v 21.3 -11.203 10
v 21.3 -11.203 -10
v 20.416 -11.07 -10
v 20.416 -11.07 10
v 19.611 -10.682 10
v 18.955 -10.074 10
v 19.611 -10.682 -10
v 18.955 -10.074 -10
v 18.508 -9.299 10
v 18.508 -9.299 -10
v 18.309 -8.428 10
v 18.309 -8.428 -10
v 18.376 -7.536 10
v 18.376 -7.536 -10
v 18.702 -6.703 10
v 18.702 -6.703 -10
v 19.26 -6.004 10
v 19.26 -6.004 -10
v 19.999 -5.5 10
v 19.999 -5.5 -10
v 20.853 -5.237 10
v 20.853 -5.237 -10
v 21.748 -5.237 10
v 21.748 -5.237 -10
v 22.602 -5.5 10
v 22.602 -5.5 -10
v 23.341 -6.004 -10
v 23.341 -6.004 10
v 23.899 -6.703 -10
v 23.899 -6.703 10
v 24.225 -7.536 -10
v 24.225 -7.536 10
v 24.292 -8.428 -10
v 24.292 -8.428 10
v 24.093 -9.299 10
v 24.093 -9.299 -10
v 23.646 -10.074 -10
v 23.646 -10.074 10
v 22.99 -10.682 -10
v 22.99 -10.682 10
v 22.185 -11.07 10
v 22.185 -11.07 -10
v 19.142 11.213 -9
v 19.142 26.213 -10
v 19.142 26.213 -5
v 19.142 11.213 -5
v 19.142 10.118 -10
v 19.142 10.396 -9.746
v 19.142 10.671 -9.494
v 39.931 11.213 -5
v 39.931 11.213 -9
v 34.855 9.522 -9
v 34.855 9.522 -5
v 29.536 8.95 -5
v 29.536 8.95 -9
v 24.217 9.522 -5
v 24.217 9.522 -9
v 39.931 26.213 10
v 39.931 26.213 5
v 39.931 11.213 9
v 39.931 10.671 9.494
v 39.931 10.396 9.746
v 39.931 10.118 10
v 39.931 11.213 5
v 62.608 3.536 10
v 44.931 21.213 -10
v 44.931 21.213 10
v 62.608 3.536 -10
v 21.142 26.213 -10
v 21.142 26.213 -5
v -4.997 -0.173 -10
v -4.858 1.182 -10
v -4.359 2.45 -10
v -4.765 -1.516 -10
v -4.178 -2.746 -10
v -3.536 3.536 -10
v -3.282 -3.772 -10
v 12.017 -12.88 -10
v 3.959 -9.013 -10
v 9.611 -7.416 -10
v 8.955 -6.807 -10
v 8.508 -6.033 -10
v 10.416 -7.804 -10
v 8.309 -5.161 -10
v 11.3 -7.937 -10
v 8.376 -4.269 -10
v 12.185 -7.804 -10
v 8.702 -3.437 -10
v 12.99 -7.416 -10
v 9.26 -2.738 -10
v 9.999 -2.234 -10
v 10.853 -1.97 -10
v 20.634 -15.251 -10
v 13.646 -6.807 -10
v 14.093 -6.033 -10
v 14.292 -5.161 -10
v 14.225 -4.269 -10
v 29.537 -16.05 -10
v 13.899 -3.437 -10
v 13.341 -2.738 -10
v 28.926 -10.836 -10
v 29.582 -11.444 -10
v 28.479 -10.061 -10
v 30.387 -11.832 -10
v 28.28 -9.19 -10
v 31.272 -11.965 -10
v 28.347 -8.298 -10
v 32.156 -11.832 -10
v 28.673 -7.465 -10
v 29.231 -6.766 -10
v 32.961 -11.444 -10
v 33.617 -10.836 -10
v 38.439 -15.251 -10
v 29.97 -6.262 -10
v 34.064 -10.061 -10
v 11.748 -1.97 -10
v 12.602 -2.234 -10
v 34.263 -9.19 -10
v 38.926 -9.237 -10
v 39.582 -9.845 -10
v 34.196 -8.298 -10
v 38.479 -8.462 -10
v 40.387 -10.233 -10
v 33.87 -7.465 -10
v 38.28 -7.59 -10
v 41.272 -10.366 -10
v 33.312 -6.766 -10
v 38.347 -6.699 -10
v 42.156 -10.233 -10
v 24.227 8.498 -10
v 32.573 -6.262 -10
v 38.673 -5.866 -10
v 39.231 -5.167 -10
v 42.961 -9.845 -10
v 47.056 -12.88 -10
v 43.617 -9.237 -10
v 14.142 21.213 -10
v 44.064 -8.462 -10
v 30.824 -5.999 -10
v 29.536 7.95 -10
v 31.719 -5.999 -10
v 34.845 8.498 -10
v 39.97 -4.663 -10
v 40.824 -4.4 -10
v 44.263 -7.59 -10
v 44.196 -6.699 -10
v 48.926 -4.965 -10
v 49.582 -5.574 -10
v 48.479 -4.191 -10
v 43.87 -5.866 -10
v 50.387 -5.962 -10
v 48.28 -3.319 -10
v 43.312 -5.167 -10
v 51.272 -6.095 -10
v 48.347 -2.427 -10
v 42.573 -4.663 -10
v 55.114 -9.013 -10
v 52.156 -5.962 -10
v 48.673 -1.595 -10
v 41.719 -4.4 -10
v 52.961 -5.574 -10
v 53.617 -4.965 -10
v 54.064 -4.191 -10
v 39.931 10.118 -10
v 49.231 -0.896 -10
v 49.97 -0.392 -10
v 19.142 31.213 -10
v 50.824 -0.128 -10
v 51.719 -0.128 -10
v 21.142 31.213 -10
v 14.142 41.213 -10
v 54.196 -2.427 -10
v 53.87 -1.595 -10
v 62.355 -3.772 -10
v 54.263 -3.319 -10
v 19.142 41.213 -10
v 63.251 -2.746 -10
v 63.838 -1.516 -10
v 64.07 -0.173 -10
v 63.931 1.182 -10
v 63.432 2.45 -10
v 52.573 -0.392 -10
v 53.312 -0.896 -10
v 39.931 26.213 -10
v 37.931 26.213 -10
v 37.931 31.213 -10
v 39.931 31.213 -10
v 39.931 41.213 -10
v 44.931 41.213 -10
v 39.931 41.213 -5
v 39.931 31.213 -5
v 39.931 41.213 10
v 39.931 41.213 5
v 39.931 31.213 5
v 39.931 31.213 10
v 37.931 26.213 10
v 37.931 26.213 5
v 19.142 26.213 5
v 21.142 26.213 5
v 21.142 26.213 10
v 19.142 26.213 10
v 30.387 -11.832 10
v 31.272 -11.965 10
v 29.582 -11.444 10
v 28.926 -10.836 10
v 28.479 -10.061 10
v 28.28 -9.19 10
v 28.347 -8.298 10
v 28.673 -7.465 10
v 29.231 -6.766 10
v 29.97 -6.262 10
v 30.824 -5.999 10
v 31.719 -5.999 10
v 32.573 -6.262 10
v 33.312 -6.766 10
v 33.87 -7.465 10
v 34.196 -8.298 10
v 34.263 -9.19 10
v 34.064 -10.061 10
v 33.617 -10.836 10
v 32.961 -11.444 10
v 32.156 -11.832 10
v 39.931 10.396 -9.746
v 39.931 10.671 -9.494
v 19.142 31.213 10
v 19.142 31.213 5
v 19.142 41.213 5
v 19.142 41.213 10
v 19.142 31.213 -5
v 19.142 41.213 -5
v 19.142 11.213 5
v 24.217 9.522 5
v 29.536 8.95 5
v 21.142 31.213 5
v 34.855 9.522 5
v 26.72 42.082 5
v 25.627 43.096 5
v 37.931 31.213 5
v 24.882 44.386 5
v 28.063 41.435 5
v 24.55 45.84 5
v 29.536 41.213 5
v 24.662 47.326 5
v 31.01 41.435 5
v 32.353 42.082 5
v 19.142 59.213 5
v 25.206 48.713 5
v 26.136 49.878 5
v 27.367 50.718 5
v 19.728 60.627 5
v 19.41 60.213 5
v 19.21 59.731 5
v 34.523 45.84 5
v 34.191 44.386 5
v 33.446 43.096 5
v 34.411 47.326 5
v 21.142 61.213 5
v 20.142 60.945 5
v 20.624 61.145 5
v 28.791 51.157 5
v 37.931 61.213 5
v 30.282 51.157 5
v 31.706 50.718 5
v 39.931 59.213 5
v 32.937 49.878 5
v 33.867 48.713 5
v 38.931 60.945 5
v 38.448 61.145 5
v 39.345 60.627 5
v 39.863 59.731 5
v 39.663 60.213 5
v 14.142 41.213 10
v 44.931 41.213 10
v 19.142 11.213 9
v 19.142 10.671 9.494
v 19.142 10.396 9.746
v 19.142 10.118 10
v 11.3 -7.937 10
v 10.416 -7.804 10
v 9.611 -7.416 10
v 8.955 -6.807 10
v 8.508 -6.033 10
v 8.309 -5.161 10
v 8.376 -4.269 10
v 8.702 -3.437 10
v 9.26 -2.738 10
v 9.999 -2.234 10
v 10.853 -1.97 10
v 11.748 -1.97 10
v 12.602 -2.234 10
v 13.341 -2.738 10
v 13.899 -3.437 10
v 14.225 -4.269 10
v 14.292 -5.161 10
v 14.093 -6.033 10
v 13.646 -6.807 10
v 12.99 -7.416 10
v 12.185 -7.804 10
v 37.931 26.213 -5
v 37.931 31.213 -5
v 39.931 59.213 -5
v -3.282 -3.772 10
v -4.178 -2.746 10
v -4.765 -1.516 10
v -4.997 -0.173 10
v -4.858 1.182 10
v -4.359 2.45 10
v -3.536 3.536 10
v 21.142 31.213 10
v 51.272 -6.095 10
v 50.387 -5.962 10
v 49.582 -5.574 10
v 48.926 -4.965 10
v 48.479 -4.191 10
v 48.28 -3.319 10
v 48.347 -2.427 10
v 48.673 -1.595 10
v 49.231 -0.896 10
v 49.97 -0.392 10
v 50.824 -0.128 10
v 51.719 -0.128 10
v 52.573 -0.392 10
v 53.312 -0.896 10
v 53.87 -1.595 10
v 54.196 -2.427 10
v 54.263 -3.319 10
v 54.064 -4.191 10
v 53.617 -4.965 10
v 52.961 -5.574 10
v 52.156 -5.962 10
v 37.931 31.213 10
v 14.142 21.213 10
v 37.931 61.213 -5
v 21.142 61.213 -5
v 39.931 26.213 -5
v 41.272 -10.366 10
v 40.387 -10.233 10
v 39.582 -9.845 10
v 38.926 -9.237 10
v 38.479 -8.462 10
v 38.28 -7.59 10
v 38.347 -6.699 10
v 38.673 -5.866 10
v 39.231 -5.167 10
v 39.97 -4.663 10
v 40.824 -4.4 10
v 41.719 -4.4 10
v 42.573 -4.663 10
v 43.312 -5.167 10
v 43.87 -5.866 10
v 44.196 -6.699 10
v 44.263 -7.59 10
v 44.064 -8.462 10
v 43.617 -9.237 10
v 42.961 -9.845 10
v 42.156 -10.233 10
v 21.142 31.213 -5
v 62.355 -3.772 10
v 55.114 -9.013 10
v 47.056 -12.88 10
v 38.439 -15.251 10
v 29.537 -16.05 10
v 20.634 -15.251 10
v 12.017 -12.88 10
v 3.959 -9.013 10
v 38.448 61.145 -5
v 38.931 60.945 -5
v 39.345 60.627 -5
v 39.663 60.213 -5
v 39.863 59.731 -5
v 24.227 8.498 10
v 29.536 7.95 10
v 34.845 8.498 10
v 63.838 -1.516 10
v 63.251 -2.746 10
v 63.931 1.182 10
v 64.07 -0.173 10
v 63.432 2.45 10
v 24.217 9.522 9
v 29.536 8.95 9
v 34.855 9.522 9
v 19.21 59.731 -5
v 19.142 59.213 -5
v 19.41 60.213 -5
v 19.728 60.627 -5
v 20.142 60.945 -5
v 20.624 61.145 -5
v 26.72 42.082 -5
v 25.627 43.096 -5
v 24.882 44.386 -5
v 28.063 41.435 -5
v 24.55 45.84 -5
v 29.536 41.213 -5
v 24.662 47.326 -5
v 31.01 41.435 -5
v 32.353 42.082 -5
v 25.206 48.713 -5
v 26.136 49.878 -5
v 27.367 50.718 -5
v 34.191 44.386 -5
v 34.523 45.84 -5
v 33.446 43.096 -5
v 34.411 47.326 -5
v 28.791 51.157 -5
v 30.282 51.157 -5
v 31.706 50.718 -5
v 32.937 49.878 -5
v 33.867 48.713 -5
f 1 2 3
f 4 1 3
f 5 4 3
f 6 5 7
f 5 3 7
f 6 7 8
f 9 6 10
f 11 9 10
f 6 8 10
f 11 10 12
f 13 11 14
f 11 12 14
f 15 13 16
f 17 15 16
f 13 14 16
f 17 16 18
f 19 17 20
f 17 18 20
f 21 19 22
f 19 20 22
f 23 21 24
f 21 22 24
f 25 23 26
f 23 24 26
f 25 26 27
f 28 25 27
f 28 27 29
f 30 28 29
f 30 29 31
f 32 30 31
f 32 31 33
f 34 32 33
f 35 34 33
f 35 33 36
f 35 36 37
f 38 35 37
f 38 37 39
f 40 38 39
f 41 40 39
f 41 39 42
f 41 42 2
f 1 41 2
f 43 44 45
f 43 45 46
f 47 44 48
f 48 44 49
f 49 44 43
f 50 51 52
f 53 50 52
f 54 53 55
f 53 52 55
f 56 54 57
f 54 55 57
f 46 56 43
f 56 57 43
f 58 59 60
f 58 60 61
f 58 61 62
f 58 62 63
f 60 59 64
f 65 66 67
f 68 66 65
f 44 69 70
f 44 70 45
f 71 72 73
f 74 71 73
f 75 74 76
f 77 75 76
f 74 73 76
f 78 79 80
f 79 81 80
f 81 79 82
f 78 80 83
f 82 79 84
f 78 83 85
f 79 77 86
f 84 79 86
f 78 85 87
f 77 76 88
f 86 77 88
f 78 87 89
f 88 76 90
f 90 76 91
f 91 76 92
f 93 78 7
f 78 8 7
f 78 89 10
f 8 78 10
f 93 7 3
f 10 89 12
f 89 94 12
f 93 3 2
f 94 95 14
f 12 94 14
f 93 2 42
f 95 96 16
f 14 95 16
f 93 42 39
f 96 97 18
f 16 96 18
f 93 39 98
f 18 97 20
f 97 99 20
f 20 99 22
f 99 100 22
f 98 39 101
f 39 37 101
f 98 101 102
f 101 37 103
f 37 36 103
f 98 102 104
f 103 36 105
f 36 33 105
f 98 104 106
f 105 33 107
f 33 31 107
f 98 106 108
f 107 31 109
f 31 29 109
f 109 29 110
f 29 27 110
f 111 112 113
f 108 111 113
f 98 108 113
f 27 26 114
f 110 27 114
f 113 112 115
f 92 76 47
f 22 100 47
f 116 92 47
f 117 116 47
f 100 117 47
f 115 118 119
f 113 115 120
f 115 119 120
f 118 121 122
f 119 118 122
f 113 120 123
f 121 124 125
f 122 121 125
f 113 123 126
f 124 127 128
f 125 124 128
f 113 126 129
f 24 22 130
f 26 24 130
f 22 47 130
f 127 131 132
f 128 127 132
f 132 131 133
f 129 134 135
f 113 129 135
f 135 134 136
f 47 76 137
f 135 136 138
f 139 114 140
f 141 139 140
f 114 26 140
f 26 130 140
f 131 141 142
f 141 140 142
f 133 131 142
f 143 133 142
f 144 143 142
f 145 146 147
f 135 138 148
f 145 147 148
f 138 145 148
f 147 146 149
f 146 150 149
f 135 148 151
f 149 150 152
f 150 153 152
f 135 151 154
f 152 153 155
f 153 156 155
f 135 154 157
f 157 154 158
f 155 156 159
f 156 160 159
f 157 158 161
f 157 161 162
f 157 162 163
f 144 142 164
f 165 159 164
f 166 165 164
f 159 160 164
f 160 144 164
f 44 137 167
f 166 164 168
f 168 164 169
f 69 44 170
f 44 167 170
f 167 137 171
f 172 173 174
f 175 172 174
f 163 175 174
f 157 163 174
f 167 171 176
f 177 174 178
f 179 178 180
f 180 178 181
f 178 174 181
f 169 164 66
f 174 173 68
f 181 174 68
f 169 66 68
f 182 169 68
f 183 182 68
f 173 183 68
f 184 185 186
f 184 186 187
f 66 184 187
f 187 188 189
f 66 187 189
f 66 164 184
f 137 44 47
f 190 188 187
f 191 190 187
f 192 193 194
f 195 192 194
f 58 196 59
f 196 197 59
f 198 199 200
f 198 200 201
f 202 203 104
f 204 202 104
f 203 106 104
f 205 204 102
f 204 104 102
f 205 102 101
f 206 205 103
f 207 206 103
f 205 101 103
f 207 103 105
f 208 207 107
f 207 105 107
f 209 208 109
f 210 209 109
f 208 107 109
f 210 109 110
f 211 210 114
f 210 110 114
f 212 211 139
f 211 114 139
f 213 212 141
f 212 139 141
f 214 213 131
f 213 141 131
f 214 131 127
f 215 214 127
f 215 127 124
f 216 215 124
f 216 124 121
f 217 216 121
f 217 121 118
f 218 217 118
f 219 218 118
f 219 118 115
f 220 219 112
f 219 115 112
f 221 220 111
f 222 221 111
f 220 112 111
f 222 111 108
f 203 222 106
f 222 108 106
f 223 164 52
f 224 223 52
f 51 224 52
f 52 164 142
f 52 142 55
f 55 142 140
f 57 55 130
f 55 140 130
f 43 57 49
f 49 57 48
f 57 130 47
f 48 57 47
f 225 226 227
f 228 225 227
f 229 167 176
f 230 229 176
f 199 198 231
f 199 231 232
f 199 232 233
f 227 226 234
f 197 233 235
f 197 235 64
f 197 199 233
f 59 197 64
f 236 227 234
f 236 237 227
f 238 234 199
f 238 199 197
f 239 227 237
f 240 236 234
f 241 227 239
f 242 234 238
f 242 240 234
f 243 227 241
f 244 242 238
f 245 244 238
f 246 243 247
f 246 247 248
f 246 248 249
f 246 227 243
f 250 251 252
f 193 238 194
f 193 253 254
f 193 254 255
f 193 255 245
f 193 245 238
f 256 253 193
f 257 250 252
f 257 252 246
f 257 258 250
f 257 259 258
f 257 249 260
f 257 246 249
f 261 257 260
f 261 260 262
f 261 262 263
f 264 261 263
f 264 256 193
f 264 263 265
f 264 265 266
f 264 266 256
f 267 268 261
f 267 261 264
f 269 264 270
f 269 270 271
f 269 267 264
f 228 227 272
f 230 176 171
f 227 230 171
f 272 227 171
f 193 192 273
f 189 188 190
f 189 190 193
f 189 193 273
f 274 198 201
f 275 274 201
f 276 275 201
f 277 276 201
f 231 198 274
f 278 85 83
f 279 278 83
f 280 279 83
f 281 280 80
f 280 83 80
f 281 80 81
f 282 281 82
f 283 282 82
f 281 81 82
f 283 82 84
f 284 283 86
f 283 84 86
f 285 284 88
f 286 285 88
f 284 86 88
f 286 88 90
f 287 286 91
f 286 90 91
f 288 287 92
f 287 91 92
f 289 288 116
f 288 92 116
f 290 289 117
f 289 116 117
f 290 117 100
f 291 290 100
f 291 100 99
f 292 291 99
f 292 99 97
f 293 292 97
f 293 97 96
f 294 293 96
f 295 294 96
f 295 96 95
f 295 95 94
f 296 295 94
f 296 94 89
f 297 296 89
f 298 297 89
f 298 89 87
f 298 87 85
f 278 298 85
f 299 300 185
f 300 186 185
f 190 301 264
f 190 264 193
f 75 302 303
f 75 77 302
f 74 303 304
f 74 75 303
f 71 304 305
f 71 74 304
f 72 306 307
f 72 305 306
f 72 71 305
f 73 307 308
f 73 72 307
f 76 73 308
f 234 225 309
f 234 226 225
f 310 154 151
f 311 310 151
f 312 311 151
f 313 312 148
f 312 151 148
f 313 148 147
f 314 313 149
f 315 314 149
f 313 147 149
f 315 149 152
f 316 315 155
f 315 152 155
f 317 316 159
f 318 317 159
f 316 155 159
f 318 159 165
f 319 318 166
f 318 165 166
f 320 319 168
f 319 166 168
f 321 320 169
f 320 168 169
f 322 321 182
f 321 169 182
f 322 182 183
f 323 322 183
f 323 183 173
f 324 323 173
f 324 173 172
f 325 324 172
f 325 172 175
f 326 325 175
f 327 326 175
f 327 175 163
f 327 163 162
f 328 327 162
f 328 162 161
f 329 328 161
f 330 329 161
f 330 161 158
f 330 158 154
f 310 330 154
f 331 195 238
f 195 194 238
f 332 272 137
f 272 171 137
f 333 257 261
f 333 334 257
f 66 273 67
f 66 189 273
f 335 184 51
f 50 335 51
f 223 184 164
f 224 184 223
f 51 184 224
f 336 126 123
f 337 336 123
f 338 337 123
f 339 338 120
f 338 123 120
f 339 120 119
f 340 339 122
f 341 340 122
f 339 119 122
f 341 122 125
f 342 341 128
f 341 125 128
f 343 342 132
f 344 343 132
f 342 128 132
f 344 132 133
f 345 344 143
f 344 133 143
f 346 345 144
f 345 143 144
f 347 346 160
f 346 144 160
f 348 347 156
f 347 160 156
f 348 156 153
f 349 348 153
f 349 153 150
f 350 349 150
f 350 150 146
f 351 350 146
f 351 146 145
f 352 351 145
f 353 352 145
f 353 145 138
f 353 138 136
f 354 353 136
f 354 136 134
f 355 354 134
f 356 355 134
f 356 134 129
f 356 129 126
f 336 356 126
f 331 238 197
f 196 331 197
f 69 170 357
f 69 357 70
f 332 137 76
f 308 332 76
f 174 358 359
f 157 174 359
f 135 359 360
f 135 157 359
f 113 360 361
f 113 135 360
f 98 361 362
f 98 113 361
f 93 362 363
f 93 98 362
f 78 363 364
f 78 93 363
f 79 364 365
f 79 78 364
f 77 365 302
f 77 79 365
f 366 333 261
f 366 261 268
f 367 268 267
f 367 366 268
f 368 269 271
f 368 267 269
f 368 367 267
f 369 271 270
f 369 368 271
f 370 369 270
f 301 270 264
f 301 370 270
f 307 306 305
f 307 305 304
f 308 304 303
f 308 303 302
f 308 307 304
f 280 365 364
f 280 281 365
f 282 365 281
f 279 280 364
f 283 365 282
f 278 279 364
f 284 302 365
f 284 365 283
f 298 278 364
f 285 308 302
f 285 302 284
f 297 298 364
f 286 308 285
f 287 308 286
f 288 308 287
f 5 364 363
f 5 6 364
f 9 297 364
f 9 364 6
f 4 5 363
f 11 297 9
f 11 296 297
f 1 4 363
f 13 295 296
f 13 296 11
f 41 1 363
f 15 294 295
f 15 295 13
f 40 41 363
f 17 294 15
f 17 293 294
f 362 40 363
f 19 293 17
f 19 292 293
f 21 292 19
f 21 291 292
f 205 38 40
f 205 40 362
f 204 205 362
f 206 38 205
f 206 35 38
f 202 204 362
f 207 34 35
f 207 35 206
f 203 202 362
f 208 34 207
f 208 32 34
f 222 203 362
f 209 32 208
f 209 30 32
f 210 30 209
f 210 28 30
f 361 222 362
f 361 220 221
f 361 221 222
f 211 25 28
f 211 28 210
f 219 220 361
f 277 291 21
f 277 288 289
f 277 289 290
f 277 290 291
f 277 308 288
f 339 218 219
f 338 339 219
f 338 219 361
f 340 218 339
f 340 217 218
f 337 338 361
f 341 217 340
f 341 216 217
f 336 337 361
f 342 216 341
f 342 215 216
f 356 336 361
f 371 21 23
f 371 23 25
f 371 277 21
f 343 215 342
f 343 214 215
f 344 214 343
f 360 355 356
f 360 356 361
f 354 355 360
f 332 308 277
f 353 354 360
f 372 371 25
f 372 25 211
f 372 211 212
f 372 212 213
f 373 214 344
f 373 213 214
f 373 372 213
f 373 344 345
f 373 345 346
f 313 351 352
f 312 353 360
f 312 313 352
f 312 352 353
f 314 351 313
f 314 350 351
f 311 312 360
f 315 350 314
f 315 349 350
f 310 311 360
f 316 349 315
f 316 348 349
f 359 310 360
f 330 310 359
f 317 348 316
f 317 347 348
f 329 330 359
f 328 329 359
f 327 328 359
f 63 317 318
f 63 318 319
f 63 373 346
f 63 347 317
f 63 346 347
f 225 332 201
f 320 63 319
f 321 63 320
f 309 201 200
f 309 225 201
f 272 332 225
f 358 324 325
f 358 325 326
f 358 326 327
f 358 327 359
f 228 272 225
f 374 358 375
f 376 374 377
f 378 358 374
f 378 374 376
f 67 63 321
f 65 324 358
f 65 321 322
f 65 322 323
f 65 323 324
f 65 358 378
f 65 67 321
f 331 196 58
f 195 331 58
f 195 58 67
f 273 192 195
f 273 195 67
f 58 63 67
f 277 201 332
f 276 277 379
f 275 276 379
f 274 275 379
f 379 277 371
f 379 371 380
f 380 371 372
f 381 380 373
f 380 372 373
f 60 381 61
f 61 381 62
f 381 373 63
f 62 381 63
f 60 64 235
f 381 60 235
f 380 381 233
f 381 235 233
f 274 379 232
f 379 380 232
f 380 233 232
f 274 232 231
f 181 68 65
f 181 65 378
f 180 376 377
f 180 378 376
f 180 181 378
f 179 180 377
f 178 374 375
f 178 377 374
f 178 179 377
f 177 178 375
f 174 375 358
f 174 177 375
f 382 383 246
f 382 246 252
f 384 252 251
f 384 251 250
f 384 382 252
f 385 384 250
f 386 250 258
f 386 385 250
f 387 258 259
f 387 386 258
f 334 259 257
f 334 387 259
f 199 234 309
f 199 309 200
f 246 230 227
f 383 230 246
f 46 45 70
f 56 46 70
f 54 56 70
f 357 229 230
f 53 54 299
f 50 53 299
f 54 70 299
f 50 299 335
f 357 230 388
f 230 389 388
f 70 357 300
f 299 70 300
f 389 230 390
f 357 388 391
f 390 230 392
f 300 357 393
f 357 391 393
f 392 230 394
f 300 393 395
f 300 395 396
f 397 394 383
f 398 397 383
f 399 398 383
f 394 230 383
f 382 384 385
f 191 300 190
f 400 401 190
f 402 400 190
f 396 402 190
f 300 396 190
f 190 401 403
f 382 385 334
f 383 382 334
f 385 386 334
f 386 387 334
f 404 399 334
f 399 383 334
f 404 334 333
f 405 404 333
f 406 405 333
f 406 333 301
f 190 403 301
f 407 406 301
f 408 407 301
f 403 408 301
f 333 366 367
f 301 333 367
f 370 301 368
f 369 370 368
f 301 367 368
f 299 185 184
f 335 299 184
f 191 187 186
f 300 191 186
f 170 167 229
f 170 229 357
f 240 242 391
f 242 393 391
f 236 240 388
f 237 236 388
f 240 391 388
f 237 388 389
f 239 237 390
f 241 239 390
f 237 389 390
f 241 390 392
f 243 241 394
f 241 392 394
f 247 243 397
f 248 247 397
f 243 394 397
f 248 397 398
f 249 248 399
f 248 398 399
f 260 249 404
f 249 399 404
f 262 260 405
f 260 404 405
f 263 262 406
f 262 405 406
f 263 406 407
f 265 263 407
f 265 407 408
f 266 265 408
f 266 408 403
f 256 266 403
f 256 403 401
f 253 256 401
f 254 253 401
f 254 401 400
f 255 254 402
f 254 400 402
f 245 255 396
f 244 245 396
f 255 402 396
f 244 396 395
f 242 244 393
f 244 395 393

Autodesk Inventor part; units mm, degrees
ref_plane "YZ Plane" through (0, 0, 0) normal (1, 0, 0) x (0, 1, 0)
ref_plane "XZ Plane" through (0, 0, 0) normal (0, 1, 0) x (-1, 0, 0)
ref_plane "XY Plane" through (0, 0, 0) normal (0, 0, 1) x (1, 0, 0)
sketch "Skizze1" plane through (0, 0, 0) normal (0, 0, 1) x (1, 0, 0)
  line L0 (19.1421, 31.2132) -> (19.1421, 61.2132)
  line L1 (19.1421, 61.2132) -> (39.9308, 61.2132)
  line L2 (39.9308, 61.2132) -> (39.9308, 31.2132)
  line L3 (39.9308, 31.2132) -> (37.9308, 31.2132)
  line L4 (37.9308, 31.2132) -> (37.9308, 26.2132)
  line L5 (37.9308, 26.2132) -> (39.9308, 26.2132)
  line L6 (39.9308, 26.2132) -> (39.9308, 11.2132)
  line L7 (19.1421, 31.2132) -> (21.1421, 31.2132)
  line L8 (21.1421, 31.2132) -> (21.1421, 26.2132)
  line L9 (21.1421, 26.2132) -> (19.1421, 26.2132)
  line L10 (19.1421, 26.2132) -> (19.1421, 11.2132)
  line L11 (39.9308, 41.2132) -> (44.9308, 41.2132)
  line L12 (44.9308, 41.2132) -> (44.9308, 21.2132)
  line L13 (19.1421, 41.2132) -> (14.1421, 41.2132)
  line L14 (14.1421, 41.2132) -> (14.1421, 21.2132)
  line L15 (14.1421, 21.2132) -> (-3.5355, 3.5355)
  arc A0 (-3.5355, 3.5355) -> (-3.2818, -3.7722) centre (0, 0) ccw
  line L16 (44.9308, 21.2132) -> (62.6085, 3.5355)
  arc A1 (62.3548, -3.7722) -> (62.6085, 3.5355) centre (59.073, 0) ccw
  arc A2 (-3.2818, -3.7722) -> (62.3548, -3.7722) centre (29.5365, 33.9499) ccw
  arc A3 (19.1421, 11.2132) -> (39.9308, 11.2132) centre (29.5365, 33.9499) ccw
  line L17 (29.5365, 33.9499) -> (29.5365, 10.2757) construction
  dimension "d0" = 90
  dimension "d1" = 5
  dimension "d2" = 50
  dimension "d3" = 25
  dimension "d4" = 20
  dimension "d5" = 10
  dimension "d6" = 5
  dimension "d7" = 5
  dimension "d8" = 30
  dimension "d9" = 2
  dimension "d10" = 15
  dimension "d11" = 25
extrude "Extrusion1" add sketch "Skizze1" along normal mid plane 10 contours L0 L1 L2 L3 L4 L5 L6 A3 L10 L9 L8 L7
extrude "Extrusion2" add sketch "Skizze1" along normal mid plane 20 contours L7 L8 L9 L10 A3 L6 L5 L4 L3 L2 L11 L12 L16 A1 A2 A0 L15 L14 L13 L0
sketch "Skizze2" plane through (0, 0, 5) normal (0, 0, 1) x (1, 0, 0)
  line L0 (39.9308, 61.2132) -> (19.1421, 61.2132) projected
  line L1 (29.5365, 61.2132) -> (29.5365, 18.1861) construction
  point P0 (0, 0)
  point P1 (29.5365, 46.2132)
  dimension "d16" = 15
hole "Bohrung1" at (29.5365, 46.2132, 5) direction (0, 0, -1) diameter 10 depth 10
chamfer "Fasen1" distance 1 angle 45 2 edges at (29.5365, 8.9499, 10) (29.5365, 8.9499, -10)
sketch "Skizze3" plane through (0, 0, 10) normal (0, 0, 1) x (1, 0, 0)
  arc A0 (6.4055, -2.2397) -> (53.6752, -1.5754) centre (29.5365, 33.9499) ccw construction
  arc A1 (-3.2818, -3.7722) -> (62.3548, -3.7722) centre (29.5365, 33.9499) ccw projected
  point P0 (0, 0)
  point P1 (21.3005, -8.2034)
  point P2 (31.2715, -8.9654)
  point P3 (41.2715, -7.3662)
  point P4 (51.2715, -3.0949)
  point P5 (11.3005, -4.9369)
  dimension "d27" = 10
  dimension "d28" = 10
  dimension "d29" = 10
  dimension "d30" = 10
hole "Bohrung2" at (21.3005, -8.2034, 10) at (31.2715, -8.9654, 10) at (41.2715, -7.3662, 10) at (51.2715, -3.0949, 10) at (11.3005, -4.9369, 10) direction (0, 0, -1) diameter 6 end through all
fillet "Rundung1" radius 2 2 edges at (19.1421, 61.2132, 0) (39.9308, 61.2132, 0)
properties part number "werkzeug" material "Stahl, galvanisiert"
